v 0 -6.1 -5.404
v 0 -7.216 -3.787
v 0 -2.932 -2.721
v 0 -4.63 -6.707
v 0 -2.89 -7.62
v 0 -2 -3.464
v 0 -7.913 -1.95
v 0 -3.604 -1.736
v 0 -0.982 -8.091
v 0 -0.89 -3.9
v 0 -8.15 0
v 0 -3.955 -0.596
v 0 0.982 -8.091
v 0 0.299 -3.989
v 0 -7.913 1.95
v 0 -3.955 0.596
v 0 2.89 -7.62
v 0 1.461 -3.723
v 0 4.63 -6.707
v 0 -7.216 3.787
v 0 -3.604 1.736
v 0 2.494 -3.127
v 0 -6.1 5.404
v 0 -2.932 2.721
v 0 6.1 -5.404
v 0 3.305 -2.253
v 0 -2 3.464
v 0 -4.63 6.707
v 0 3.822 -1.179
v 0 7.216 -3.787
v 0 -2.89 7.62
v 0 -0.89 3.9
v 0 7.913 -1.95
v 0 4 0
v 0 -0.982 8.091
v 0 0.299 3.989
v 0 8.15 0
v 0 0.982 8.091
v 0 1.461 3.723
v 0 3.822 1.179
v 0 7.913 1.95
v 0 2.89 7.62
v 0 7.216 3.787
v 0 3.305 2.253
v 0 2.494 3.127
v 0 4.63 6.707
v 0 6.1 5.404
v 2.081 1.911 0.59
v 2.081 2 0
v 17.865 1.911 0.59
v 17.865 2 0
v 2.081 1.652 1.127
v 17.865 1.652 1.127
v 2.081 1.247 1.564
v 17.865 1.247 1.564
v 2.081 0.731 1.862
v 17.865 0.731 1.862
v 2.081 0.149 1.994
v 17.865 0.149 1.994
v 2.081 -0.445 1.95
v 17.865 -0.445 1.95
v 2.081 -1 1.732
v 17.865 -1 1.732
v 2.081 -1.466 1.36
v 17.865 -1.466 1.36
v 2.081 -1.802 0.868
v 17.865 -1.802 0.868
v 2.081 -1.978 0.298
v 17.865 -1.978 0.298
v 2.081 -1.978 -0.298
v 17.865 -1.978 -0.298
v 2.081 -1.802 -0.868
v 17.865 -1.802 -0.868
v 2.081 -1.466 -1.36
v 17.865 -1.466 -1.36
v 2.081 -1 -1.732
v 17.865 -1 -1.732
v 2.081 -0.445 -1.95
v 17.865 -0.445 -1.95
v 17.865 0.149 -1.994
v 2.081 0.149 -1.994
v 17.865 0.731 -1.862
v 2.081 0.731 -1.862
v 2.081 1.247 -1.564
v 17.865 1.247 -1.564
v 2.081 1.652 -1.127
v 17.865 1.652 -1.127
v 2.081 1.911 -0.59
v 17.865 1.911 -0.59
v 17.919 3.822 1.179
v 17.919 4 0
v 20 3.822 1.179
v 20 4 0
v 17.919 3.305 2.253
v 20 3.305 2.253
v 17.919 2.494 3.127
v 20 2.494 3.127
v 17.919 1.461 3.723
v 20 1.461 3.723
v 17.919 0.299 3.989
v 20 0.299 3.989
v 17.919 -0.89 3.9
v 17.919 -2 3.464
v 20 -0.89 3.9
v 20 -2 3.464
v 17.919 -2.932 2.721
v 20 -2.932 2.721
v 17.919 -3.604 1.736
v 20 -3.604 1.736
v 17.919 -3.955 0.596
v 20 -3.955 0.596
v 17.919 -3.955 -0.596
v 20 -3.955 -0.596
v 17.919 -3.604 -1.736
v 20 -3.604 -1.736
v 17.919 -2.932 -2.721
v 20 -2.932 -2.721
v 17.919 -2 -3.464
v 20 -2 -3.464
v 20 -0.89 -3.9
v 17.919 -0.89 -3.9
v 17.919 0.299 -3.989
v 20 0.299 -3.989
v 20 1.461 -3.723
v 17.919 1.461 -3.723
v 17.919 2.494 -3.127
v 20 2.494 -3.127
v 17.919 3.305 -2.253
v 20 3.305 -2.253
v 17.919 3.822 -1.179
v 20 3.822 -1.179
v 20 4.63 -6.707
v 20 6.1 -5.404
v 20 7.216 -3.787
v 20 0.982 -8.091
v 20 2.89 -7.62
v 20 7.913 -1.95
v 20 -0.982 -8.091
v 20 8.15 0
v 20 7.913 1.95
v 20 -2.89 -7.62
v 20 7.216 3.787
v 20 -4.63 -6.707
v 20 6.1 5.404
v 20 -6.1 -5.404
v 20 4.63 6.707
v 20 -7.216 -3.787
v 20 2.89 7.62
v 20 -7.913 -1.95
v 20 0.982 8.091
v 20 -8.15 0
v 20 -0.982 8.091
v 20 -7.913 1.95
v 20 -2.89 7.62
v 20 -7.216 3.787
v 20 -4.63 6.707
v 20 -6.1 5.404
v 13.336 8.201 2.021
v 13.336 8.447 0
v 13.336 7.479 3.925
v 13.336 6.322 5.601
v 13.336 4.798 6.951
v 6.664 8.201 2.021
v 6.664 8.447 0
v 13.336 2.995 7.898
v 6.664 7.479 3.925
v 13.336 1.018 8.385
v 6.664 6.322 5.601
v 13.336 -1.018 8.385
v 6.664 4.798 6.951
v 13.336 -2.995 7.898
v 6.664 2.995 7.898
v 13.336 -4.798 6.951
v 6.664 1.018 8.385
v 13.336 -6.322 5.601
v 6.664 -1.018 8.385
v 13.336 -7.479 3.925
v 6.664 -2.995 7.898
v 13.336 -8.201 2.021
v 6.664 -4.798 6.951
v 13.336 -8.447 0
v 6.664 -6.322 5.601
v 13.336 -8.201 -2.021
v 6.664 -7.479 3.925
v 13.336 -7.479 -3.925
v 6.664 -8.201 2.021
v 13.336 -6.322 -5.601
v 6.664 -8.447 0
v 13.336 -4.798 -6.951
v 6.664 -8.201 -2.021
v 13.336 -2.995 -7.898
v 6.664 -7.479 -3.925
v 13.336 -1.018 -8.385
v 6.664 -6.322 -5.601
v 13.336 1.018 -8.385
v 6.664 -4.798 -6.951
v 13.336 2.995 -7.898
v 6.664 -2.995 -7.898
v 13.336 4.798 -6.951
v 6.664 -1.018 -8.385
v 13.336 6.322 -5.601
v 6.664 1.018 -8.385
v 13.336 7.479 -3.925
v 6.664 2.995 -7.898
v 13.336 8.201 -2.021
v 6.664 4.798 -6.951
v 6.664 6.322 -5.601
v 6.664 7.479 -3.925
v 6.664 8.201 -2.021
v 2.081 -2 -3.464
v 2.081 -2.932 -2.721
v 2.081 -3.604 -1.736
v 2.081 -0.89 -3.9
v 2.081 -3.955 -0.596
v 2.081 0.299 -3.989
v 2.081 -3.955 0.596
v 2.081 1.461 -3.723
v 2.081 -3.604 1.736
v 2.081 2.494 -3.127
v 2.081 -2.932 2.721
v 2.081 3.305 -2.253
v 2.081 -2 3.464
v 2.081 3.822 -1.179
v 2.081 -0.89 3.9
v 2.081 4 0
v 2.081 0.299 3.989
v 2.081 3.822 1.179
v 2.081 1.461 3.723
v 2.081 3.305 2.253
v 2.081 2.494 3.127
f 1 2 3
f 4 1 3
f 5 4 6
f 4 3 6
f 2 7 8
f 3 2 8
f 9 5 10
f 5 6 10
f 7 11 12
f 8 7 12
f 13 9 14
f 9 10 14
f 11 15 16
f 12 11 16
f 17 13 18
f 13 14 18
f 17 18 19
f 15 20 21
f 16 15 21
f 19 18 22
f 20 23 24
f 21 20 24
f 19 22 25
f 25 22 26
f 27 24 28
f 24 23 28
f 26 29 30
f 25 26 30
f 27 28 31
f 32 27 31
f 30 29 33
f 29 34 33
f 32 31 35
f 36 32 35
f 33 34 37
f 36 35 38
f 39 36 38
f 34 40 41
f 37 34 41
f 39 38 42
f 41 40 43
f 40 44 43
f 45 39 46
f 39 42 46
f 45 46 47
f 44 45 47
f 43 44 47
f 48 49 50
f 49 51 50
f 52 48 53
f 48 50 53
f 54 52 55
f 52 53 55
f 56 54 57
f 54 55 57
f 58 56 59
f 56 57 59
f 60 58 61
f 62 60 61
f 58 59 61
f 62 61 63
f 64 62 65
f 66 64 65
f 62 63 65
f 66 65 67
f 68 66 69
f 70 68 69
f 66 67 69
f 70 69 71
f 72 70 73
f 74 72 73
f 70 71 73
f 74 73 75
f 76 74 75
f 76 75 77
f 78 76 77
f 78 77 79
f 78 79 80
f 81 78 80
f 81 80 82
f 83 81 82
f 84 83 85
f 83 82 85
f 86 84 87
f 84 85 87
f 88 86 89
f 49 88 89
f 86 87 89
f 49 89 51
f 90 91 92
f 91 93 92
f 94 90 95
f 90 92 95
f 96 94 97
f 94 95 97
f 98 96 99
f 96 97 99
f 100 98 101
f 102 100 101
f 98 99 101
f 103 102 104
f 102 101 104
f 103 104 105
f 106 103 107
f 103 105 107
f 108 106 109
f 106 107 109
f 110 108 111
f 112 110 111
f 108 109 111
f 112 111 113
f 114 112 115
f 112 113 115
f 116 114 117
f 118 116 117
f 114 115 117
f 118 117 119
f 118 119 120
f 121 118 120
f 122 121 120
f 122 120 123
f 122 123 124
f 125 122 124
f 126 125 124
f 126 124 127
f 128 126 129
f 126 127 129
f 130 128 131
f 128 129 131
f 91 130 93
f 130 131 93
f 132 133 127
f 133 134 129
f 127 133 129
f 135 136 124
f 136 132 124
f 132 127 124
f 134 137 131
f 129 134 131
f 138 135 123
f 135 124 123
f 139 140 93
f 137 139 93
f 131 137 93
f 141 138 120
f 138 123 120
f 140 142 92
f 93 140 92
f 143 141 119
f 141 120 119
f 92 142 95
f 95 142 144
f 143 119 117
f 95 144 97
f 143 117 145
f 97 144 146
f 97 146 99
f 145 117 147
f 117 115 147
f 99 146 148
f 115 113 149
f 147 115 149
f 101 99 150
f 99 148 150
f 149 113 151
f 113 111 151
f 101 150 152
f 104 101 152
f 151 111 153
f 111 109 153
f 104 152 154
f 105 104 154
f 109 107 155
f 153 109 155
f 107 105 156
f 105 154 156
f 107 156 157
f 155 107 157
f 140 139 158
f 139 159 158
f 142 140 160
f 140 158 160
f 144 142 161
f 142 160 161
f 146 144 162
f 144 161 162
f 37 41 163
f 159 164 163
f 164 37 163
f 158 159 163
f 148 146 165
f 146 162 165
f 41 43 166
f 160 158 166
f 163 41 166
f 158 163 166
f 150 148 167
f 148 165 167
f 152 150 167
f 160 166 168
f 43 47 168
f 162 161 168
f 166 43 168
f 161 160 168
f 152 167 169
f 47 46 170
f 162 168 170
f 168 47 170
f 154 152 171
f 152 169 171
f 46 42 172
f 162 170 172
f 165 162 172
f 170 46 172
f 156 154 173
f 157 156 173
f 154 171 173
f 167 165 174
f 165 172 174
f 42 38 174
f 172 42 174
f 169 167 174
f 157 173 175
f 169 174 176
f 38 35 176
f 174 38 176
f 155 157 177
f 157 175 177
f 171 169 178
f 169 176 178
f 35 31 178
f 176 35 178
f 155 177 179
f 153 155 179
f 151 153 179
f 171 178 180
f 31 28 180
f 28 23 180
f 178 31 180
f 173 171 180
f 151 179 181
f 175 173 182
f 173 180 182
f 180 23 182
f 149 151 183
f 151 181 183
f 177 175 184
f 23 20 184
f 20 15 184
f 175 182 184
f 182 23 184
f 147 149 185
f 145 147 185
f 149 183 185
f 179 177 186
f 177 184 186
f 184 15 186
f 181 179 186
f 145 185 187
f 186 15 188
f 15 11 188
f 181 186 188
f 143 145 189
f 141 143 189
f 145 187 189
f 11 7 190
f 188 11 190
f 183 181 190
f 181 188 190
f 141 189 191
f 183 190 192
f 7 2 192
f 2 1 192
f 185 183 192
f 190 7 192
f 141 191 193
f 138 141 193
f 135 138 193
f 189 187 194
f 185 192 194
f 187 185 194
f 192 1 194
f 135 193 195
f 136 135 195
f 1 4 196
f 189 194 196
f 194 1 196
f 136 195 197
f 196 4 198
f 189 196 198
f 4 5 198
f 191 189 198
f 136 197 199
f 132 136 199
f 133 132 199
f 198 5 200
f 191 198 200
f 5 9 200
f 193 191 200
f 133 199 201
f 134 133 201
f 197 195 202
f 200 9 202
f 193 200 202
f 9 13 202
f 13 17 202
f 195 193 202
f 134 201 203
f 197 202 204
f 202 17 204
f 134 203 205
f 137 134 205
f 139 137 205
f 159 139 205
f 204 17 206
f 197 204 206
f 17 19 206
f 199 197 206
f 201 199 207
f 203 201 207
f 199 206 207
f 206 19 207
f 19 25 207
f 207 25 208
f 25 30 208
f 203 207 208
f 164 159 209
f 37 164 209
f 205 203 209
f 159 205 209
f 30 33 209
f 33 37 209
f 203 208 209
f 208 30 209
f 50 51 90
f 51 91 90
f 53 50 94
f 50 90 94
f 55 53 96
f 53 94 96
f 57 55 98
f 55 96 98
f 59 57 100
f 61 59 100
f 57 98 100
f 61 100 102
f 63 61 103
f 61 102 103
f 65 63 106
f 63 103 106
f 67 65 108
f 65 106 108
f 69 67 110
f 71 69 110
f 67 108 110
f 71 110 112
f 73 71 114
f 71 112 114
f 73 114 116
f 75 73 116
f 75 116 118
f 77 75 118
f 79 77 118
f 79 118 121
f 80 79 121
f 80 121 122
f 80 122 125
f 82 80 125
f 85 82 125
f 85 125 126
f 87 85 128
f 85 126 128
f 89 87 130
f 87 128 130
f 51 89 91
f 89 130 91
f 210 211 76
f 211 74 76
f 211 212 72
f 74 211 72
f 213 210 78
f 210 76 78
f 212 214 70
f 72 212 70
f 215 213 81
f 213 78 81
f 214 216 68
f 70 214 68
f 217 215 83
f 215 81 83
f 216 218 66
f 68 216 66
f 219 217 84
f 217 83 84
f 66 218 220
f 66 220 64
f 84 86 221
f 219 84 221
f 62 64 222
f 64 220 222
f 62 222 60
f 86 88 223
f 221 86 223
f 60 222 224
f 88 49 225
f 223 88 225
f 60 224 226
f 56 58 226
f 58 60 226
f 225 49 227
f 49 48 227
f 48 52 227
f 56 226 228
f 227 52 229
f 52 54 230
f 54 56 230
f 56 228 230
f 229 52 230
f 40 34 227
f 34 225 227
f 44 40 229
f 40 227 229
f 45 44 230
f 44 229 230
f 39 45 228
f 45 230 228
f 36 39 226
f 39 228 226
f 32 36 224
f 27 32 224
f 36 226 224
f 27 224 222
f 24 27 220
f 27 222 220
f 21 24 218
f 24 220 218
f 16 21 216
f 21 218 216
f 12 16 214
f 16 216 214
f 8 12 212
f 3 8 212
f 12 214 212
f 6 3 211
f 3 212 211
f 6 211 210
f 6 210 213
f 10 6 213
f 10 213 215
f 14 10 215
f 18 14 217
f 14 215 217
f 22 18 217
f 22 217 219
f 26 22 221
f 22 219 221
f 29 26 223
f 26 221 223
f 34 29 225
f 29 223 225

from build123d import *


with BuildPart() as part:
    # Sketch1 → Revolve1 (revolve)
    with BuildSketch(Plane.XY):
        with BuildLine():
            Line((0, 8.15), (0, 4))
            Line((0, 4), (2.081081081, 4))
            Line((2.081081081, 4), (2.081081081, 2))
            Line((2.081081081, 2), (17.864864865, 2))
            Line((17.864864865, 2), (17.918918919, 4))
            Line((17.918918919, 4), (20, 4))
            Line((20, 4), (20, 8.15))
            ThreePointArc((20, 8.15), (10, 8.483704529), (0, 8.15))
        make_face()
    revolve(axis=Axis((0, 0, 0), (1, 0, 0)))


solid = part.part
